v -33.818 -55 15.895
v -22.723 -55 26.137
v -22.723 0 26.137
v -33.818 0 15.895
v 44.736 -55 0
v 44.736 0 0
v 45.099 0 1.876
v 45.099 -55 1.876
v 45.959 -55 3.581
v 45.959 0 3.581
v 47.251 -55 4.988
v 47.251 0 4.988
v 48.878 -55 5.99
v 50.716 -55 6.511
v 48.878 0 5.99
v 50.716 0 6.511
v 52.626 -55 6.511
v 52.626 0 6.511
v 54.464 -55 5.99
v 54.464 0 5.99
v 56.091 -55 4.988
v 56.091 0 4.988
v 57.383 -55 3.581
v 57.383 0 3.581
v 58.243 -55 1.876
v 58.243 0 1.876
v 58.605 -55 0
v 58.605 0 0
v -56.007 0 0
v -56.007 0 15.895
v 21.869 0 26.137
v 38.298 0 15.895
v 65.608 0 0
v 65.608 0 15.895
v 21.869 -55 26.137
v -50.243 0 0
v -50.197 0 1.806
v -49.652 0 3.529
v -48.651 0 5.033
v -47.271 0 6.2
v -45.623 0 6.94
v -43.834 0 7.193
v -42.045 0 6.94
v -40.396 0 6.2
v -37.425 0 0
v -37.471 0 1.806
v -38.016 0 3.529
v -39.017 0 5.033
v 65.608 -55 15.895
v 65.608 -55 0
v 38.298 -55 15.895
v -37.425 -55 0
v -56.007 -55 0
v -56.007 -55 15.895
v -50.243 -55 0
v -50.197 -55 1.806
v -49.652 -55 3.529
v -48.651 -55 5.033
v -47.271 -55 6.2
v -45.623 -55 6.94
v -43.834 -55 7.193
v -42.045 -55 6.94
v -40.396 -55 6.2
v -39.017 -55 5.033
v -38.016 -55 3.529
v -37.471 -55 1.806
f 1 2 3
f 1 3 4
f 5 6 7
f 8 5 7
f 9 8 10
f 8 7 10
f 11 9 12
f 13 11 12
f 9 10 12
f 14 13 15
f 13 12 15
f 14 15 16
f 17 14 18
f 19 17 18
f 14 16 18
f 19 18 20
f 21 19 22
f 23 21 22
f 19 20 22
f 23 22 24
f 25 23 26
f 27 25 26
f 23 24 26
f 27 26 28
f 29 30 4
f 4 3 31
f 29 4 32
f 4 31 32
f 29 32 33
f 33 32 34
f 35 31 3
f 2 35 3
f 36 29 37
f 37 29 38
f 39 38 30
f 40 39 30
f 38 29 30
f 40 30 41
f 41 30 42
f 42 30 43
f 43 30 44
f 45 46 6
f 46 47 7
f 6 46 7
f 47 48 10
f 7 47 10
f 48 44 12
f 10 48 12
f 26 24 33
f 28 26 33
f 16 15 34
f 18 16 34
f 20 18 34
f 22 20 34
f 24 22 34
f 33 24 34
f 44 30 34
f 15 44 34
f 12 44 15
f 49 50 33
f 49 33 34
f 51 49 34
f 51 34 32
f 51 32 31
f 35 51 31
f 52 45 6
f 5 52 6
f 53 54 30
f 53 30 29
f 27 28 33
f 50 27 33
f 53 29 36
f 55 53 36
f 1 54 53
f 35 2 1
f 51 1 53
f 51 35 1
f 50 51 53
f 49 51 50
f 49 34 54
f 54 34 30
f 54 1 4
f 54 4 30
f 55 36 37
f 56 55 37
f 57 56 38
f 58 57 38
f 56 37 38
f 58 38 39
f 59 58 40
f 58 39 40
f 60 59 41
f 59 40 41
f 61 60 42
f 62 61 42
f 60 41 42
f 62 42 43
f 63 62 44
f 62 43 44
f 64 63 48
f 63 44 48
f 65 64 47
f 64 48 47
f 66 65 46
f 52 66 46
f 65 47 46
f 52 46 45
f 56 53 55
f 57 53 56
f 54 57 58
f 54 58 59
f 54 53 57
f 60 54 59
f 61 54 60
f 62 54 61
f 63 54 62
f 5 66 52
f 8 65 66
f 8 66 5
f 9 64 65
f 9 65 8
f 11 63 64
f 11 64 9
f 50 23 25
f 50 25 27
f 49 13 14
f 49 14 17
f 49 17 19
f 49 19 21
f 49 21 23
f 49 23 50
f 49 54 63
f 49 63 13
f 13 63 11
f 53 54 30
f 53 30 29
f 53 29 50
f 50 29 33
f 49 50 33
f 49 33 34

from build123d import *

# Parameters (mm, degrees)
F2_DEPTH = 55


with BuildPart() as f2:
    # F1 (on face) → F2 (new body)
    with BuildSketch(Plane.XZ):
        with BuildLine():
            ThreePointArc((44.7364263237, 0), (51.6707431525, 6.576540475), (58.6050599813, 0))
            Line((58.6050599813, 0), (65.6081959605, 0))
            Line((65.6081959605, 0), (65.6081959605, 15.8953191712))
            Line((65.6081959605, 15.8953191712), (38.2981188595, 15.8953191712))
            Line((38.2981188595, 15.8953191712), (33.3908423781, 15.8953191712))
            Line((33.3908423781, 15.8953191712), (-29.3370001018, 15.8953191712))
            Line((-29.3370001018, 15.8953191712), (-33.8175594807, 15.8953191712))
            Line((-33.8175594807, 15.8953191712), (-56.007001549, 15.8953191712))
            Line((-56.007001549, 15.8953191712), (-56.007001549, 0))
            Line((-56.007001549, 0), (-50.2426885068, 0))
            ThreePointArc((-50.2426885068, 0), (-43.83370094, 7.1925667007), (-37.4247133732, 0))
            Line((-37.4247133732, 0), (44.7364263237, 0))
        make_face()
    extrude(amount=F2_DEPTH)


with BuildPart() as f2b:
    # F0 (on Front) → F2, piece 2 (new body)
    with BuildSketch(Plane.XZ):
        Polygon((-56.007001549, 15.8953191712), (-56.007001549, 0), (65.6081959605, 0), (65.6081959605, 15.8953191712), (38.2981188595, 15.8953191712), (33.3908423781, 15.8953191712), (-29.3370001018, 15.8953191712), (-33.8175594807, 15.8953191712), align=None)
        Polygon((-22.7228403091, 26.1366013438), (-33.8175594807, 15.8953191712), (-29.3370001018, 15.8953191712), (33.3908423781, 15.8953191712), (38.2981188595, 15.8953191712), (21.8694005162, 26.1366013438), align=None)
    extrude(amount=F2_DEPTH)


solid = Compound([f2.part, f2b.part])
